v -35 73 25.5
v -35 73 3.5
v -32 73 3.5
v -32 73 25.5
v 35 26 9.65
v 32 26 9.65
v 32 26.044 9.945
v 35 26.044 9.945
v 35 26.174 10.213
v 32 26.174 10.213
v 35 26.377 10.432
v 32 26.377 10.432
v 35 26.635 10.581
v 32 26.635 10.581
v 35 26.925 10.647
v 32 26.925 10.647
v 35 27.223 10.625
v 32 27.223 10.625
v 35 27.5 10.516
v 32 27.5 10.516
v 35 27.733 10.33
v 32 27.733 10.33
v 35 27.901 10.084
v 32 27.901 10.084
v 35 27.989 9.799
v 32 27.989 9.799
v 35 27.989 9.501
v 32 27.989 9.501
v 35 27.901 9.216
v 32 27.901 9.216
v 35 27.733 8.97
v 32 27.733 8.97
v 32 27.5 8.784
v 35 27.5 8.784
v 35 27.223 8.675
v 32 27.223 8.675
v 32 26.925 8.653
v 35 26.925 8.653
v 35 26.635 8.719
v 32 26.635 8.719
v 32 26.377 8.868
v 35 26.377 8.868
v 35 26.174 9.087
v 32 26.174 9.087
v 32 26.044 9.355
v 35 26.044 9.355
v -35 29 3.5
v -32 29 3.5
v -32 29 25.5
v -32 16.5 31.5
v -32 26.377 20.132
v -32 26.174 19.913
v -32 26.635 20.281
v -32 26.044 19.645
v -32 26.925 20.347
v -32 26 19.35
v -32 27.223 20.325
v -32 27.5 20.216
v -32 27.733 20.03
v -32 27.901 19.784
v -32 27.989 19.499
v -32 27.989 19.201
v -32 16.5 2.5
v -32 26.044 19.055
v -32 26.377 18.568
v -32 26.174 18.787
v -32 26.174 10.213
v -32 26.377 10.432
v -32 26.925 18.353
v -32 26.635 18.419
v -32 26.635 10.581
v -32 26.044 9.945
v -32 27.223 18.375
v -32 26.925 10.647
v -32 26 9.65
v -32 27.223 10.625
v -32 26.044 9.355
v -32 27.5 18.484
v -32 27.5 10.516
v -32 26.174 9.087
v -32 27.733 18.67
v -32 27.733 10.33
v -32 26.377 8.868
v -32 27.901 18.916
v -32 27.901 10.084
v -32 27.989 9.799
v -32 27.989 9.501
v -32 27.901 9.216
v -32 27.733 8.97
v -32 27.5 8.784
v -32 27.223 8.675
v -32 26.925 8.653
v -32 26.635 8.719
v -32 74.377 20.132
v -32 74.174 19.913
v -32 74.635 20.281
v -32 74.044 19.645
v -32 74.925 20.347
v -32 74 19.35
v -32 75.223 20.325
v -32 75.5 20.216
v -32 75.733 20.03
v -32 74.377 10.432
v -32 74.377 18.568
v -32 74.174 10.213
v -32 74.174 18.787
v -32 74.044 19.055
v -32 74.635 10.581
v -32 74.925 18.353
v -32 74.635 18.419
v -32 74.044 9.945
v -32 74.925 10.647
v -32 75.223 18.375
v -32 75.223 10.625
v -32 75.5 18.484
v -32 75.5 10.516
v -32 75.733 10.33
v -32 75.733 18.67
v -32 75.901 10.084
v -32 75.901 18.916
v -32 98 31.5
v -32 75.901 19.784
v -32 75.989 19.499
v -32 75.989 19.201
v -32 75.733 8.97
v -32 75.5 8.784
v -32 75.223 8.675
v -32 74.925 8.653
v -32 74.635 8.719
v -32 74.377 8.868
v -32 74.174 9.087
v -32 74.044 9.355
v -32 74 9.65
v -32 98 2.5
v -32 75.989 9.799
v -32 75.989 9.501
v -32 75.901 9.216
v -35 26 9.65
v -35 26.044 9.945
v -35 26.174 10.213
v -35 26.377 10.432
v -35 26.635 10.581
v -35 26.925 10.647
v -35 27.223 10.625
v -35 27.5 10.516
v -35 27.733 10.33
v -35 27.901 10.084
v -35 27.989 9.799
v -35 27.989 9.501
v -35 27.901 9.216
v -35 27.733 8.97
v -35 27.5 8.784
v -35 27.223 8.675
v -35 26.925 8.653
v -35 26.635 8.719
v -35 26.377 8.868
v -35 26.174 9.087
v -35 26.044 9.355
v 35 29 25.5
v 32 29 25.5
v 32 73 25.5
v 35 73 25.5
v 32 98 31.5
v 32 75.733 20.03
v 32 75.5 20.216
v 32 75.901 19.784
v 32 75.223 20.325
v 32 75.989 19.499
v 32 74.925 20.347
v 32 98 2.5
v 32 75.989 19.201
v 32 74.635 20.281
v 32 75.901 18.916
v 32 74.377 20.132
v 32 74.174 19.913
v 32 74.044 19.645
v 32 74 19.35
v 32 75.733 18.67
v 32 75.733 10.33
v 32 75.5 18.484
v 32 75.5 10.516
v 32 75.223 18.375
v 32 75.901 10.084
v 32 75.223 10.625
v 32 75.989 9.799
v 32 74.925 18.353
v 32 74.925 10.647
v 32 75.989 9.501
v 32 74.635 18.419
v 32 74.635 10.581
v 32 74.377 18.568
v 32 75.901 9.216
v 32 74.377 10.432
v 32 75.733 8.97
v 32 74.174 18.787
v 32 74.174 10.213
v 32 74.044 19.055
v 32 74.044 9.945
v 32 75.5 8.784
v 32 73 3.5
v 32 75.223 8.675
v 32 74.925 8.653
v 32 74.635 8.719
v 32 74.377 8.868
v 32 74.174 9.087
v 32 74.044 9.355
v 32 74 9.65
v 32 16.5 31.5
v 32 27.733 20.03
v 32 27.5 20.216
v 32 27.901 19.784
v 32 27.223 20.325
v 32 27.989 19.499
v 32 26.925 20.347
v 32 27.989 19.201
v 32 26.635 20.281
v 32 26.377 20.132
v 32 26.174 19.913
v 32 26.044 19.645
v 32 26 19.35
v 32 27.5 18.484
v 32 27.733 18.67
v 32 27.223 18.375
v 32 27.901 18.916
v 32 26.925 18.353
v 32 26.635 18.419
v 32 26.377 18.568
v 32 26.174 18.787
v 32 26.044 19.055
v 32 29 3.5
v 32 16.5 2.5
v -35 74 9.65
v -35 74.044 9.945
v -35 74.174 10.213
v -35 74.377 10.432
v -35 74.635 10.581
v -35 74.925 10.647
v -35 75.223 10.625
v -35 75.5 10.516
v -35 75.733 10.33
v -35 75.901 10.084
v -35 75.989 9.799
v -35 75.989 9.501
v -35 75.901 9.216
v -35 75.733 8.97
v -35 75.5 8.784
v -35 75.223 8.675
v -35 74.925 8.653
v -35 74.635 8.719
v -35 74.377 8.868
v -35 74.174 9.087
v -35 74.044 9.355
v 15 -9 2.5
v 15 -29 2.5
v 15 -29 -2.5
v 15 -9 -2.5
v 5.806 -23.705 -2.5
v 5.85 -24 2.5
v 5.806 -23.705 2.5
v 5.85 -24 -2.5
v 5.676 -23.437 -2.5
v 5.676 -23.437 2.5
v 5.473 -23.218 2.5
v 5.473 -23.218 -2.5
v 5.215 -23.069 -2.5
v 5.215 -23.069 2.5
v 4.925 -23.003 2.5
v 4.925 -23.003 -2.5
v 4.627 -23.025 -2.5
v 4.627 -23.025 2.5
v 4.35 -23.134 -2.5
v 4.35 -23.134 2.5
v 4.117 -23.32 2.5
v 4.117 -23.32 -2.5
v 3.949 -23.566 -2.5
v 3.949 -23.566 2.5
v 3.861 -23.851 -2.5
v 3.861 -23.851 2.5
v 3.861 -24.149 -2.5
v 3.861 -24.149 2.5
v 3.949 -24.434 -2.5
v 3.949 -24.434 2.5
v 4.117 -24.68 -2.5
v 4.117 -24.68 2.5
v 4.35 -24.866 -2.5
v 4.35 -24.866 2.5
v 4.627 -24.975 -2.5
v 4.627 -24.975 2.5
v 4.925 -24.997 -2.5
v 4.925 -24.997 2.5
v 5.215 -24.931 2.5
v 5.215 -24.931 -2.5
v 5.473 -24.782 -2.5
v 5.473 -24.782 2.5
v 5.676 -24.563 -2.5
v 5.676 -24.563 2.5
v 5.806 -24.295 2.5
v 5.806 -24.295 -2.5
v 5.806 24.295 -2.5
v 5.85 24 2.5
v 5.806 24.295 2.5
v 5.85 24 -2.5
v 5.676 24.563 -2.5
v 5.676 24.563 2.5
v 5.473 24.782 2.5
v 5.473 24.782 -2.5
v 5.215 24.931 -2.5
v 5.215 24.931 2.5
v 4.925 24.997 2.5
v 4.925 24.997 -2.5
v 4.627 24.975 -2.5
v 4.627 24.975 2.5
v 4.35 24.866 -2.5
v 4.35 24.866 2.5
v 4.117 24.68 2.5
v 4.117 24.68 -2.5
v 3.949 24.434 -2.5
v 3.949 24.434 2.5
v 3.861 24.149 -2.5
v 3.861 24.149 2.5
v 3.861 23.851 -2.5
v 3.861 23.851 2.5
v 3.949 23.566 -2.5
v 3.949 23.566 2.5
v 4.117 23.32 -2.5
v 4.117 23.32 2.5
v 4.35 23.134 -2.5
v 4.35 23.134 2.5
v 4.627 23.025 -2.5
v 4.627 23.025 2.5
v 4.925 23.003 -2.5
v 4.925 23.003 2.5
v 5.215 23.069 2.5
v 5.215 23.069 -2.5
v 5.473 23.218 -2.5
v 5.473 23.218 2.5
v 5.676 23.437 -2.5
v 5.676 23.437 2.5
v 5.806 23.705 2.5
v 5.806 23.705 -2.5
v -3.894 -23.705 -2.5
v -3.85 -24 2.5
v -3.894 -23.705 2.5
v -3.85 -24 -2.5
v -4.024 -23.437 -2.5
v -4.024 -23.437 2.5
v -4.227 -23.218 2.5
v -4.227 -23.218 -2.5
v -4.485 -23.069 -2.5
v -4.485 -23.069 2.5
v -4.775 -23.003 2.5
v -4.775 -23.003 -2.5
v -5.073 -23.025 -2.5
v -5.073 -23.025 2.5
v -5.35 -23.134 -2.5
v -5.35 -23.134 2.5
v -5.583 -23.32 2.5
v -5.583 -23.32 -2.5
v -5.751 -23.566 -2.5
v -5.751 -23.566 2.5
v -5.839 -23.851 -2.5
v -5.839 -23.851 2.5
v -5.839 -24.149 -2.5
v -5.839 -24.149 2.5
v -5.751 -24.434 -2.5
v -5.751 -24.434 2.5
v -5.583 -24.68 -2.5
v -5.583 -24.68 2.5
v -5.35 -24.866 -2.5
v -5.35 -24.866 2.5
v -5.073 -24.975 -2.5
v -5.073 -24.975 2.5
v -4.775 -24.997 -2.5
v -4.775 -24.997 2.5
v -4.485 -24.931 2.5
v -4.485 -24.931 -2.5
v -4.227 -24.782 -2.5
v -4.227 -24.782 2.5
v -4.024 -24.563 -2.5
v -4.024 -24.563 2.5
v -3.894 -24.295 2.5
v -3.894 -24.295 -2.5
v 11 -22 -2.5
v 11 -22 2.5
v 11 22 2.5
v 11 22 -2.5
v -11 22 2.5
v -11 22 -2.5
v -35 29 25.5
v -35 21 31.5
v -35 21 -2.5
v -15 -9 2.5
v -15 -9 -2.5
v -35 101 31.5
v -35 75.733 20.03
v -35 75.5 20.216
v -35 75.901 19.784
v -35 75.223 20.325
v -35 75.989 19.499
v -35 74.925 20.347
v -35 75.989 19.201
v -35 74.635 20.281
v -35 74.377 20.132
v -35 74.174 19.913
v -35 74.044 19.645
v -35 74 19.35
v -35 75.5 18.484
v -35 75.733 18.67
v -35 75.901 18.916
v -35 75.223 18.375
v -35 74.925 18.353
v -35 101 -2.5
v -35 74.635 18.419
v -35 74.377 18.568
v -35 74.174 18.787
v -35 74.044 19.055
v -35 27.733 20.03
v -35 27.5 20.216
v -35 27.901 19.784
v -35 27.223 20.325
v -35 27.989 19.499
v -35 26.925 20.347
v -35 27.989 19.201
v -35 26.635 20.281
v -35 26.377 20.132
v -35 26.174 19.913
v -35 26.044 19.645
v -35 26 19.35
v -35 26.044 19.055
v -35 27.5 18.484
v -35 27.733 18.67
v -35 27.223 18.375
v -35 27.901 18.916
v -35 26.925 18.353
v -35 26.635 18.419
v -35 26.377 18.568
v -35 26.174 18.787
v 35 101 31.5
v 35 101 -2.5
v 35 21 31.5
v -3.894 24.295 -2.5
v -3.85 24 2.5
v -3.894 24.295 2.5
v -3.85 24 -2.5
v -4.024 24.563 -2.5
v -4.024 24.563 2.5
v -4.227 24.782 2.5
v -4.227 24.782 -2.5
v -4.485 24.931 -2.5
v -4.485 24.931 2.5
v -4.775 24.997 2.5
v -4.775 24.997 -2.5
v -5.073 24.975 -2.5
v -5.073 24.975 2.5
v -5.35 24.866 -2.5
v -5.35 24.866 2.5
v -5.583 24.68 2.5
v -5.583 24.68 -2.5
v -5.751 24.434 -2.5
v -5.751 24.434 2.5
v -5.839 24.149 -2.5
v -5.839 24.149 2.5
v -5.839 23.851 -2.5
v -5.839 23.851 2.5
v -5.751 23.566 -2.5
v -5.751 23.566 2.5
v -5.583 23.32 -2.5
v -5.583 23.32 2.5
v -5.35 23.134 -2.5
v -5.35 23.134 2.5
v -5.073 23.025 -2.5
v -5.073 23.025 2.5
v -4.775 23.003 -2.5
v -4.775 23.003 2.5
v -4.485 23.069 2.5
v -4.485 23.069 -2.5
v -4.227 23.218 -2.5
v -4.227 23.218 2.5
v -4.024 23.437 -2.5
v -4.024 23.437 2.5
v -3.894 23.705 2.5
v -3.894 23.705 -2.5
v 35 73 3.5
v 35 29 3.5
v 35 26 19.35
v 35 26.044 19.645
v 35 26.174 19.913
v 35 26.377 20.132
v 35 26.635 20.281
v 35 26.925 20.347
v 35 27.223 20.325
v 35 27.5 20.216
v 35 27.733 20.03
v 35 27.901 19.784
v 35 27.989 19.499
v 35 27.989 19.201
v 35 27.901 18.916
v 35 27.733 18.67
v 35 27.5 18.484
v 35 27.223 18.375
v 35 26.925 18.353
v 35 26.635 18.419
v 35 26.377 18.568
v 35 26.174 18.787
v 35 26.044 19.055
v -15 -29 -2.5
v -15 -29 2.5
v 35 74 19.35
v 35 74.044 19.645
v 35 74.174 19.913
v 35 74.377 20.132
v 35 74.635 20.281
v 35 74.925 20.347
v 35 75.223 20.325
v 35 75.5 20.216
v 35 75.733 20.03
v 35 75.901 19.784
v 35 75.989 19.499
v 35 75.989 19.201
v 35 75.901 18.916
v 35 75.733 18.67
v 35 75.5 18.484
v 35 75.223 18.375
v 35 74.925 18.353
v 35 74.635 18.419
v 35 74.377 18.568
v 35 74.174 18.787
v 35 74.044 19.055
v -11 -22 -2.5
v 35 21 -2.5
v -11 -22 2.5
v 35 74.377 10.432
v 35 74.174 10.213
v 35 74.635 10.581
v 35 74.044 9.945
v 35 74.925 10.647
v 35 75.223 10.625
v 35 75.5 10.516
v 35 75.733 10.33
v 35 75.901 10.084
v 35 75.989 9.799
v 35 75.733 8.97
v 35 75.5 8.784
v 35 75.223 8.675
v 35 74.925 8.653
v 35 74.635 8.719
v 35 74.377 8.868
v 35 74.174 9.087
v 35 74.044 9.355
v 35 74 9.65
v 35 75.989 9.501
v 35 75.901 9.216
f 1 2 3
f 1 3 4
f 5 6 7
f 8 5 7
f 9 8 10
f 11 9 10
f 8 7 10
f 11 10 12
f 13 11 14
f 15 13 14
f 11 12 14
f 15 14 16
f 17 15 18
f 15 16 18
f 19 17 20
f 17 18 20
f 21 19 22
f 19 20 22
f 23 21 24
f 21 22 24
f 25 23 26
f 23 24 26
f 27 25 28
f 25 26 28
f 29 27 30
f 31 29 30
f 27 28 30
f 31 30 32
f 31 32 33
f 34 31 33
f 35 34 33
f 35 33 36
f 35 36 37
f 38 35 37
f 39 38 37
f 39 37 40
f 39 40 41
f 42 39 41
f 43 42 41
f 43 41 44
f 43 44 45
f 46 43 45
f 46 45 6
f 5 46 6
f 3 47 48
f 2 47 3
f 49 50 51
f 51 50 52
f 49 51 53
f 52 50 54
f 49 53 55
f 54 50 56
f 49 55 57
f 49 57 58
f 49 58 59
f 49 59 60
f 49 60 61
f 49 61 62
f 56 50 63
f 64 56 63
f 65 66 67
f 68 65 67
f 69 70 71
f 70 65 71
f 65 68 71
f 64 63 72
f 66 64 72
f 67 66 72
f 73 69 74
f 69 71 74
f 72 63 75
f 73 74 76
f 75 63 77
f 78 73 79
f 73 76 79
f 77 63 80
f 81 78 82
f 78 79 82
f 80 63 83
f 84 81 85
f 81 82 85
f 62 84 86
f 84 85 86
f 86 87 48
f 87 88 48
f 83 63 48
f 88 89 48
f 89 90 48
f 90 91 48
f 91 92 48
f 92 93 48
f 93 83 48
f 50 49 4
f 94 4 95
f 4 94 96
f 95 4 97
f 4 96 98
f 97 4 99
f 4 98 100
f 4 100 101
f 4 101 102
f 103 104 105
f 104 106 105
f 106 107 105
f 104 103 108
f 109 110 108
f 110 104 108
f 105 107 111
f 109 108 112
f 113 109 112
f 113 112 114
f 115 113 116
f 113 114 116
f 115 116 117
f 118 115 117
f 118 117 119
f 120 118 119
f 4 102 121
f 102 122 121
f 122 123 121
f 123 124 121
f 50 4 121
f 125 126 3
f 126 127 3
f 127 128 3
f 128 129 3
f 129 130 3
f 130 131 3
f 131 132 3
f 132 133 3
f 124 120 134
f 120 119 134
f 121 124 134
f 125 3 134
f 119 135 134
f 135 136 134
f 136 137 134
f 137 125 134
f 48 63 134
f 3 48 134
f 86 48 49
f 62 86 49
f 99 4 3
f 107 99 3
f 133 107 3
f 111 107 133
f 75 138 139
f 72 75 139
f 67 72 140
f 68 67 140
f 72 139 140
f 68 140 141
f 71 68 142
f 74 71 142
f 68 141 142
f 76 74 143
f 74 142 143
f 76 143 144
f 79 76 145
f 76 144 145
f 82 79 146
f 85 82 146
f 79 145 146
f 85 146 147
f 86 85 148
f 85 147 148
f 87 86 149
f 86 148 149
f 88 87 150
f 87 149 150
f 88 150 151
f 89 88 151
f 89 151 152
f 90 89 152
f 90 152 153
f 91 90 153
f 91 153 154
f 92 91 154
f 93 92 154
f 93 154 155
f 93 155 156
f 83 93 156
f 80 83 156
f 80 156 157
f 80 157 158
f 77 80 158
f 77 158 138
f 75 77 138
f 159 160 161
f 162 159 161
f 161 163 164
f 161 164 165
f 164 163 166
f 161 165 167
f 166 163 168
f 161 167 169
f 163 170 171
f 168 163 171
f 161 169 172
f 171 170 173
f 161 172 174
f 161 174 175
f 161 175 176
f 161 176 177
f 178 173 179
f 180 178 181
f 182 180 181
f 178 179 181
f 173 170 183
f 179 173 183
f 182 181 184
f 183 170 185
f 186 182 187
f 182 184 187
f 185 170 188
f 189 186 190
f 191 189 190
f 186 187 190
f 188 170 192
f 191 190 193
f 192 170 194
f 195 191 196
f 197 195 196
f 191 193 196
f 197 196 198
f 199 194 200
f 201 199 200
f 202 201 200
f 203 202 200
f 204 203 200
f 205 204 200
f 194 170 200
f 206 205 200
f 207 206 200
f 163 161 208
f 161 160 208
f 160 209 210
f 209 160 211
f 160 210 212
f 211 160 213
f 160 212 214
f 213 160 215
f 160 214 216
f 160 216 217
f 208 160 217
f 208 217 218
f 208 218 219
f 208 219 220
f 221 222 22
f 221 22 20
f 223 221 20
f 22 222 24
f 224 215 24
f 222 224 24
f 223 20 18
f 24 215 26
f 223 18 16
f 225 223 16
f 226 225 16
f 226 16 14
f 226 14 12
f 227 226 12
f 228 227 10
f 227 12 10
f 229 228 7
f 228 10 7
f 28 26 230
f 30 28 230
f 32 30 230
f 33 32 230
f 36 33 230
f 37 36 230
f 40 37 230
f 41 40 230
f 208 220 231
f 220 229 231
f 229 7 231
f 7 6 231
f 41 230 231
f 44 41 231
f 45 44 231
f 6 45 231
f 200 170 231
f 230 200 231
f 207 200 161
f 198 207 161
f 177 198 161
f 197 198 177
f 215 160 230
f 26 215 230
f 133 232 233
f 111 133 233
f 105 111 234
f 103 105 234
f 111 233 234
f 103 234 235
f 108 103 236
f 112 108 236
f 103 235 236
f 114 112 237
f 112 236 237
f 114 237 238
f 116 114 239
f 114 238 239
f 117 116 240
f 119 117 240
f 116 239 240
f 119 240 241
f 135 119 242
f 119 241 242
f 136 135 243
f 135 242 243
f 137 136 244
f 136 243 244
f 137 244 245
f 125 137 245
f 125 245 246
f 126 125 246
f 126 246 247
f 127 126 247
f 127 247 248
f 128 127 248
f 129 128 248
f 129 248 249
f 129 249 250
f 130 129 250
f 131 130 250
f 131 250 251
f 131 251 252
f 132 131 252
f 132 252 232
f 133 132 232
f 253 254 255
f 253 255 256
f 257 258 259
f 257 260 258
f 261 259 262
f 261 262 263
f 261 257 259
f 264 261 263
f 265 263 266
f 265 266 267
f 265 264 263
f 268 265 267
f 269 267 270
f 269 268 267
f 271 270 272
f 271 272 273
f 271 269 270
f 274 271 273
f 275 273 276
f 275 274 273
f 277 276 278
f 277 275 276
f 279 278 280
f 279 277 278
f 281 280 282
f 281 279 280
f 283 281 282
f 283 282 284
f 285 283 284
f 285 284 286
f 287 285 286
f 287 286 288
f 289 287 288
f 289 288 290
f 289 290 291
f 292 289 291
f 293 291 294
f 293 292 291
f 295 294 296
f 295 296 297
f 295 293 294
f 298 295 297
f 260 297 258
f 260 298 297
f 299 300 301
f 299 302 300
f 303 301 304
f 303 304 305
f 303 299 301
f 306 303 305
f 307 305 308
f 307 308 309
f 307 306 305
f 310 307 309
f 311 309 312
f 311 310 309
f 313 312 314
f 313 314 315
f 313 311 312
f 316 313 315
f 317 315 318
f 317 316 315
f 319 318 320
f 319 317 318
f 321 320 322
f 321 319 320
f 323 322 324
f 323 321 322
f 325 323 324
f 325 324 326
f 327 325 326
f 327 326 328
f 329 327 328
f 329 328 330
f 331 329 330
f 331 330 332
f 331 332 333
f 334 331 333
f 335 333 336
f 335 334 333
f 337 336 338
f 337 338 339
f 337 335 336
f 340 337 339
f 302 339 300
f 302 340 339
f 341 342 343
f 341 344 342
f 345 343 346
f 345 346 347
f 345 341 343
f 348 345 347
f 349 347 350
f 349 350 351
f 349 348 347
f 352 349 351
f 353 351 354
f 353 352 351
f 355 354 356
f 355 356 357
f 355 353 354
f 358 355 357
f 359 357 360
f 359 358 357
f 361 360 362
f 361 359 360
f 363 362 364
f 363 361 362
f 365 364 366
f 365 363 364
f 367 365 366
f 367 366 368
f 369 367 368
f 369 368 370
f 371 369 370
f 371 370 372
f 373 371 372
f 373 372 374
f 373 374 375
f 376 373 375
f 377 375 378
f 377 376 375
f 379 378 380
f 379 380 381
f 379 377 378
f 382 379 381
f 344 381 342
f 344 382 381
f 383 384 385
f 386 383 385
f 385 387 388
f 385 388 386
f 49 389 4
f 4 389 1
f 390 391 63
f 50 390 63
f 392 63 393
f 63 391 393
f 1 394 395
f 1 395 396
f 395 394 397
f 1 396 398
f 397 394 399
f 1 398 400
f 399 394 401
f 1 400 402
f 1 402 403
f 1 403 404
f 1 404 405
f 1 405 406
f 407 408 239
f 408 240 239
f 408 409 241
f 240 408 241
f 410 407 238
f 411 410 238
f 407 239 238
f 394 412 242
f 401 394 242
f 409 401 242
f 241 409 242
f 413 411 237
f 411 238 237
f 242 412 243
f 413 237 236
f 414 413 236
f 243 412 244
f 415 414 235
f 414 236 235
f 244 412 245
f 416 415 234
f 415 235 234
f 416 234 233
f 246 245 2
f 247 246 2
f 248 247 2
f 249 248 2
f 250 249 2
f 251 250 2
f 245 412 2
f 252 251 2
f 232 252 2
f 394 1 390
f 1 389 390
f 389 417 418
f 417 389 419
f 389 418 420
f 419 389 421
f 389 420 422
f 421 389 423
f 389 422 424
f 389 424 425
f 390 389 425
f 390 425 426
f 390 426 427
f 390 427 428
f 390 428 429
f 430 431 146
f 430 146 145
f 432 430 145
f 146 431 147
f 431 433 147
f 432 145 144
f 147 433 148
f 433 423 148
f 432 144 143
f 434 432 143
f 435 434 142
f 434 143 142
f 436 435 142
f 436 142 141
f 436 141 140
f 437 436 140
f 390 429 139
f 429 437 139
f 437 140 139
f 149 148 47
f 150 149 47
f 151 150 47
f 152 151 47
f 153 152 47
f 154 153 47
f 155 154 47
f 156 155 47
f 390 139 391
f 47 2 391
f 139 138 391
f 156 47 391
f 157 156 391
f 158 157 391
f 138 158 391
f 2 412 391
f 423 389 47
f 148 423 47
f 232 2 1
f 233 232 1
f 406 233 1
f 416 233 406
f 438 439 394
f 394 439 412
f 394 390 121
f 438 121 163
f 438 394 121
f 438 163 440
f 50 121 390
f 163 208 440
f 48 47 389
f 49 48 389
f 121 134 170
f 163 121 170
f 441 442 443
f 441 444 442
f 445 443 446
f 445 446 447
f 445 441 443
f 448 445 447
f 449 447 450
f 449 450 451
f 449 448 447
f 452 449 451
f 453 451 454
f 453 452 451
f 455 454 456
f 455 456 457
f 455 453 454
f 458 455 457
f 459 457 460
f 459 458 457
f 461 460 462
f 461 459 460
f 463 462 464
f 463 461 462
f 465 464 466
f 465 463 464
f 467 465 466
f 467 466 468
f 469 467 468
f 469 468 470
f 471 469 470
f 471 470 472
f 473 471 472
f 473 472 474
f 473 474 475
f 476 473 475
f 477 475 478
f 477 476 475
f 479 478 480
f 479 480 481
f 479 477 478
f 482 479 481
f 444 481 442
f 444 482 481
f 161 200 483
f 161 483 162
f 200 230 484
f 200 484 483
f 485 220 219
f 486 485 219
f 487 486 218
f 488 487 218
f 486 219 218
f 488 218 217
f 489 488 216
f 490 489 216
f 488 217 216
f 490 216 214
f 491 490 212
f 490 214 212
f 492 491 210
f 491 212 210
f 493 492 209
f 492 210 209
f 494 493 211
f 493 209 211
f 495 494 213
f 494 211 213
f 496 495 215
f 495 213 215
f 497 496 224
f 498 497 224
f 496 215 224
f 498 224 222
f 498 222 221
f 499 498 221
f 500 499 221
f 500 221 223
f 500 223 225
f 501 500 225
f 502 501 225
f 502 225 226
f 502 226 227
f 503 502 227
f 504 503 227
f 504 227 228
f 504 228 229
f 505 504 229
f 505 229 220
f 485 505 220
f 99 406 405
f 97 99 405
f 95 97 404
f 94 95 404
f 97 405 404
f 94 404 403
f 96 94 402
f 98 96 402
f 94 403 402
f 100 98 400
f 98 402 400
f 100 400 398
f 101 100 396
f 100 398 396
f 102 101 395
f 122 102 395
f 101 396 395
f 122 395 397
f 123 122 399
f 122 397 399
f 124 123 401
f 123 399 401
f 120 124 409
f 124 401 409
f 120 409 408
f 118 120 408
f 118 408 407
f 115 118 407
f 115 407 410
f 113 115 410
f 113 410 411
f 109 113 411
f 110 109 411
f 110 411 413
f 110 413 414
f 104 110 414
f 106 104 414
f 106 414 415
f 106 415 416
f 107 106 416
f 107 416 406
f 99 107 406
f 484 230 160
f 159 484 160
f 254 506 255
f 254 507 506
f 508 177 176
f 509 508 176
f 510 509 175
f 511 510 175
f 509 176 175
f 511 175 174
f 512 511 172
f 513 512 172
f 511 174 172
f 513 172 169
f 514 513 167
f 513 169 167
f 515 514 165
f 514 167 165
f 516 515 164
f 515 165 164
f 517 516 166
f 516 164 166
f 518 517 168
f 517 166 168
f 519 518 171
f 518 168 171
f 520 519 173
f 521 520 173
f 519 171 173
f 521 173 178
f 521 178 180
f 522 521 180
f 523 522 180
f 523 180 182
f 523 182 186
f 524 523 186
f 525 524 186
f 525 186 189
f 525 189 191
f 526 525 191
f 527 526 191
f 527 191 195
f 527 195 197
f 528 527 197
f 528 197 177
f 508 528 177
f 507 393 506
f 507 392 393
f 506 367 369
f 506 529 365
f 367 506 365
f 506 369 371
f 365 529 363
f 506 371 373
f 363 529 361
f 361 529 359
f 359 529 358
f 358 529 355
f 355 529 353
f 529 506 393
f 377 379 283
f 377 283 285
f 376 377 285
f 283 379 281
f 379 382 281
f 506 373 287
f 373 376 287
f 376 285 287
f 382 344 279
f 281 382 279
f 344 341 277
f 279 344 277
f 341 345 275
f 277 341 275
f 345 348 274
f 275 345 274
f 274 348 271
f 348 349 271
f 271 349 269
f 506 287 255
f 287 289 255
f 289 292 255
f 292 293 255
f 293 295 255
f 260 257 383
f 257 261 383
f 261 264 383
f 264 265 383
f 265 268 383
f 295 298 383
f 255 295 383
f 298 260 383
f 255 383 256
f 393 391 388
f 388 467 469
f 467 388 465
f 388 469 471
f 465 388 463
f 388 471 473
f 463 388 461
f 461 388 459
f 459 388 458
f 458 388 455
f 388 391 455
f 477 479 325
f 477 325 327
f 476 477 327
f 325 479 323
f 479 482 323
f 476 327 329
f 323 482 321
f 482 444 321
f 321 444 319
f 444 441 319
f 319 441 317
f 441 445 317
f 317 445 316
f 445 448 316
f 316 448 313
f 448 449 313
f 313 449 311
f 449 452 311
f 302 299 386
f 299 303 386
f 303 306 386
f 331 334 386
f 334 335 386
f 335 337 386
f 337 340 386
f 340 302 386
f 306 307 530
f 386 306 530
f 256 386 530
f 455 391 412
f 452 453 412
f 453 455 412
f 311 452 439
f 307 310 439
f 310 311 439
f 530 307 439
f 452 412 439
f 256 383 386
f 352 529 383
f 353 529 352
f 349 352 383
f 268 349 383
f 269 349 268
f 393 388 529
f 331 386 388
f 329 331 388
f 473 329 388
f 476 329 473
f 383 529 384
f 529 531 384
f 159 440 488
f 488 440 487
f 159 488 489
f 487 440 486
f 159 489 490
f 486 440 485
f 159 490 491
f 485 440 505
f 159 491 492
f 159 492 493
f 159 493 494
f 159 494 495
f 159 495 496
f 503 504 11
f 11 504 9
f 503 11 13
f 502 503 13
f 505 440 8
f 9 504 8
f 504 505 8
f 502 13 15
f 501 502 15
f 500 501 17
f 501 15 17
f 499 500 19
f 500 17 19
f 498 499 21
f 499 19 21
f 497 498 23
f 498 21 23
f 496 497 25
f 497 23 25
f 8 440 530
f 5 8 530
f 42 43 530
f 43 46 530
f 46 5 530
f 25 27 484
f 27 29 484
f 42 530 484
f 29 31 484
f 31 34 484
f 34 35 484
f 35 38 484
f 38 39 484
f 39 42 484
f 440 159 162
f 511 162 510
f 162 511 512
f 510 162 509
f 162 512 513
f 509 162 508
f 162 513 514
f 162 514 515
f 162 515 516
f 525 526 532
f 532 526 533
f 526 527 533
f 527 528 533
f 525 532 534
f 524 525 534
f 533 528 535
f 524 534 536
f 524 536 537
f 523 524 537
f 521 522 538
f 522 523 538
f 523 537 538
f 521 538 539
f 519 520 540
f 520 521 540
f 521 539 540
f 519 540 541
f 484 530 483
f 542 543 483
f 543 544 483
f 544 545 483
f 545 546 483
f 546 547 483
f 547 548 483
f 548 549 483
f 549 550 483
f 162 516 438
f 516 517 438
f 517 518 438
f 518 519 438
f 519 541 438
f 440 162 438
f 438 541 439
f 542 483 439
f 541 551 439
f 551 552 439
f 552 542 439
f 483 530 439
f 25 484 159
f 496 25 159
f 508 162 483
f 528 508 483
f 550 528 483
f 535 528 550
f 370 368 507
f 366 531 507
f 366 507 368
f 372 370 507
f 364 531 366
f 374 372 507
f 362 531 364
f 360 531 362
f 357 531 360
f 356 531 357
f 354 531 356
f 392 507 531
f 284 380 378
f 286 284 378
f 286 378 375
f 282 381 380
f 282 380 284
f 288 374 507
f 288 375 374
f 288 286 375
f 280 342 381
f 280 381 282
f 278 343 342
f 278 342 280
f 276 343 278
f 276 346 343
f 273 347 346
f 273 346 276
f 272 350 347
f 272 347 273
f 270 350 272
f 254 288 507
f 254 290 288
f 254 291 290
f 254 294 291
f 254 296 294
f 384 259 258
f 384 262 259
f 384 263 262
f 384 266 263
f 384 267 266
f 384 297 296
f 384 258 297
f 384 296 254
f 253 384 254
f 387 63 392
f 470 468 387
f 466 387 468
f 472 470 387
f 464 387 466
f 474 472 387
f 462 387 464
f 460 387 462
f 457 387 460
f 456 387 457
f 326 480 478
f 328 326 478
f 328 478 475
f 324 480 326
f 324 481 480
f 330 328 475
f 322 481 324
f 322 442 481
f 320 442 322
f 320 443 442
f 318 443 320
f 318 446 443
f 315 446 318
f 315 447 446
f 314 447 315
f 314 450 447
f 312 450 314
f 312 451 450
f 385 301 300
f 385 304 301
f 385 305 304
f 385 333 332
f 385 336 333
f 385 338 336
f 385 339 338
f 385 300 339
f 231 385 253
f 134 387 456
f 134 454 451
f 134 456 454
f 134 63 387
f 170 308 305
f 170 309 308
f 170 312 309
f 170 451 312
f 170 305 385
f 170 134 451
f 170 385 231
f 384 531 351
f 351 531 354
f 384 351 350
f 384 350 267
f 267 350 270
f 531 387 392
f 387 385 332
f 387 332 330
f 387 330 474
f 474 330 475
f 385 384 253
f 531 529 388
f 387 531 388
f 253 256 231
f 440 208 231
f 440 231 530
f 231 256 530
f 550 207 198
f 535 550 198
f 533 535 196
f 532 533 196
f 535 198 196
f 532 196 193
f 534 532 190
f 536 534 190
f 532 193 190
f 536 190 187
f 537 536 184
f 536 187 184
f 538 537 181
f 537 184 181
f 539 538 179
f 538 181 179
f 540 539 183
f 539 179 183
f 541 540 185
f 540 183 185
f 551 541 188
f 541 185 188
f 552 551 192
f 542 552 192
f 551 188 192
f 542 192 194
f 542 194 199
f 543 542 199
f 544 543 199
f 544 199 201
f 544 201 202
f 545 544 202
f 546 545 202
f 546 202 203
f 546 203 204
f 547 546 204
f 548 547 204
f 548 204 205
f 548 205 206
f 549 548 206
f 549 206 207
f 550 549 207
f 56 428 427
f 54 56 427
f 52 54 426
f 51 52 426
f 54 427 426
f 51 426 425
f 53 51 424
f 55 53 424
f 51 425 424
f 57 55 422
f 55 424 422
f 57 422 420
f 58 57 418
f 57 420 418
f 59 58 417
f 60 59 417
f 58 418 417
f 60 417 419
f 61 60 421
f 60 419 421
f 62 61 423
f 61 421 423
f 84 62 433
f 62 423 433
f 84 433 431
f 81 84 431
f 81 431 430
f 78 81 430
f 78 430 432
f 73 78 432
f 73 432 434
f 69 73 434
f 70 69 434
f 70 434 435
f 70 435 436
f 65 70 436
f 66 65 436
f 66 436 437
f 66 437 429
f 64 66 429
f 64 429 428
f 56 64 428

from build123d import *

# Parameters (mm, degrees)
SKETCH1_R           = 1
SKETCH1_W           = 22
SKETCH1_H           = 44
BOSS_EXTRUDE1_DEPTH = 2.5
BOSS_EXTRUDE2_DEPTH = 34
CUT_EXTRUDE1_REACH  = 128.859
SKETCH3_R           = 1
SKETCH3_W           = 22
SKETCH3_H           = 44


with BuildPart() as part:
    # Sketch1 → Boss-Extrude1 (new, symmetric)
    with BuildSketch(Plane.XY):
        Polygon((-15, -29), (15, -29), (15, -9), (35, 21), (35, 101), (-35, 101), (-35, 21), (-15, -9), align=None)
        with Locations((-4.85, -24)):
            Circle(SKETCH1_R, mode=Mode.SUBTRACT)
        with Locations((4.85, -24)):
            Circle(SKETCH1_R, mode=Mode.SUBTRACT)
        with Locations((4.85, 24)):
            Circle(SKETCH1_R, mode=Mode.SUBTRACT)
        with Locations((-4.85, 24)):
            Circle(SKETCH1_R, mode=Mode.SUBTRACT)
        Rectangle(SKETCH1_W, SKETCH1_H, mode=Mode.SUBTRACT)
    extrude(amount=BOSS_EXTRUDE1_DEPTH, both=True)

    # Sketch2 → Boss-Extrude2 (add)
    with BuildSketch(Plane.XY.offset(-2.5)):
        Polygon((-35, 101), (-35, 21), (-32, 16.5), (-32, 98), (32, 98), (32, 16.5), (35, 21), (35, 101), align=None)
    extrude(amount=BOSS_EXTRUDE2_DEPTH)

    # Cut-Extrude1: up to this face of the body (flat: up to its plane)
    cut_extrude1_end = Plane(part.part.faces().sort_by_distance((35, 61, 14.5))[0])
    # Sketch3 → Cut-Extrude1 (cut, up to the picked face)
    with BuildSketch(Plane.ZY.offset(35), mode=Mode.PRIVATE) as cut_extrude1_sk1:
        with Locations(Location((9.65, 27, 0), (0, 0, 270))):
            Circle(SKETCH3_R)
    cut_extrude1_tool1 = split(extrude(cut_extrude1_sk1.sketch, amount=-CUT_EXTRUDE1_REACH, mode=Mode.PRIVATE), bisect_by=cut_extrude1_end, keep=Keep.BOTH, mode=Mode.PRIVATE)
    # Sketch3 → Cut-Extrude1 (cut, up to the picked face)
    with BuildSketch(Plane.ZY.offset(35), mode=Mode.PRIVATE) as cut_extrude1_sk2:
        with Locations(Location((19.35, 27, 0), (0, 0, 270))):
            Circle(SKETCH3_R)
    cut_extrude1_tool2 = split(extrude(cut_extrude1_sk2.sketch, amount=-CUT_EXTRUDE1_REACH, mode=Mode.PRIVATE), bisect_by=cut_extrude1_end, keep=Keep.BOTH, mode=Mode.PRIVATE)
    # Sketch3 → Cut-Extrude1 (cut, up to the picked face)
    with BuildSketch(Plane.ZY.offset(35), mode=Mode.PRIVATE) as cut_extrude1_sk3:
        with Locations(Location((19.35, 75, 0), (0, 0, 270))):
            Circle(SKETCH3_R)
    cut_extrude1_tool3 = split(extrude(cut_extrude1_sk3.sketch, amount=-CUT_EXTRUDE1_REACH, mode=Mode.PRIVATE), bisect_by=cut_extrude1_end, keep=Keep.BOTH, mode=Mode.PRIVATE)
    # Sketch3 → Cut-Extrude1 (cut, up to the picked face)
    with BuildSketch(Plane.ZY.offset(35), mode=Mode.PRIVATE) as cut_extrude1_sk4:
        with Locations(Location((9.65, 75, 0), (0, 0, 270))):
            Circle(SKETCH3_R)
    cut_extrude1_tool4 = split(extrude(cut_extrude1_sk4.sketch, amount=-CUT_EXTRUDE1_REACH, mode=Mode.PRIVATE), bisect_by=cut_extrude1_end, keep=Keep.BOTH, mode=Mode.PRIVATE)
    # Sketch3 → Cut-Extrude1 (cut, up to the picked face)
    with BuildSketch(Plane.ZY.offset(35), mode=Mode.PRIVATE) as cut_extrude1_sk5:
        with Locations((14.5, 51)):
            Rectangle(SKETCH3_W, SKETCH3_H)
    cut_extrude1_tool5 = split(extrude(cut_extrude1_sk5.sketch, amount=-CUT_EXTRUDE1_REACH, mode=Mode.PRIVATE), bisect_by=cut_extrude1_end, keep=Keep.BOTH, mode=Mode.PRIVATE)
    add(cut_extrude1_tool1.solids().sort_by(Axis((-35, 27, 9.65), (1, 0, 0)))[0], mode=Mode.SUBTRACT)
    add(cut_extrude1_tool2.solids().sort_by(Axis((-35, 27, 19.35), (1, 0, 0)))[0], mode=Mode.SUBTRACT)
    add(cut_extrude1_tool3.solids().sort_by(Axis((-35, 75, 19.35), (1, 0, 0)))[0], mode=Mode.SUBTRACT)
    add(cut_extrude1_tool4.solids().sort_by(Axis((-35, 75, 9.65), (1, 0, 0)))[0], mode=Mode.SUBTRACT)
    add(cut_extrude1_tool5.solids().sort_by(Axis((-35, 51, 14.5), (1, 0, 0)))[0], mode=Mode.SUBTRACT)


solid = part.part
